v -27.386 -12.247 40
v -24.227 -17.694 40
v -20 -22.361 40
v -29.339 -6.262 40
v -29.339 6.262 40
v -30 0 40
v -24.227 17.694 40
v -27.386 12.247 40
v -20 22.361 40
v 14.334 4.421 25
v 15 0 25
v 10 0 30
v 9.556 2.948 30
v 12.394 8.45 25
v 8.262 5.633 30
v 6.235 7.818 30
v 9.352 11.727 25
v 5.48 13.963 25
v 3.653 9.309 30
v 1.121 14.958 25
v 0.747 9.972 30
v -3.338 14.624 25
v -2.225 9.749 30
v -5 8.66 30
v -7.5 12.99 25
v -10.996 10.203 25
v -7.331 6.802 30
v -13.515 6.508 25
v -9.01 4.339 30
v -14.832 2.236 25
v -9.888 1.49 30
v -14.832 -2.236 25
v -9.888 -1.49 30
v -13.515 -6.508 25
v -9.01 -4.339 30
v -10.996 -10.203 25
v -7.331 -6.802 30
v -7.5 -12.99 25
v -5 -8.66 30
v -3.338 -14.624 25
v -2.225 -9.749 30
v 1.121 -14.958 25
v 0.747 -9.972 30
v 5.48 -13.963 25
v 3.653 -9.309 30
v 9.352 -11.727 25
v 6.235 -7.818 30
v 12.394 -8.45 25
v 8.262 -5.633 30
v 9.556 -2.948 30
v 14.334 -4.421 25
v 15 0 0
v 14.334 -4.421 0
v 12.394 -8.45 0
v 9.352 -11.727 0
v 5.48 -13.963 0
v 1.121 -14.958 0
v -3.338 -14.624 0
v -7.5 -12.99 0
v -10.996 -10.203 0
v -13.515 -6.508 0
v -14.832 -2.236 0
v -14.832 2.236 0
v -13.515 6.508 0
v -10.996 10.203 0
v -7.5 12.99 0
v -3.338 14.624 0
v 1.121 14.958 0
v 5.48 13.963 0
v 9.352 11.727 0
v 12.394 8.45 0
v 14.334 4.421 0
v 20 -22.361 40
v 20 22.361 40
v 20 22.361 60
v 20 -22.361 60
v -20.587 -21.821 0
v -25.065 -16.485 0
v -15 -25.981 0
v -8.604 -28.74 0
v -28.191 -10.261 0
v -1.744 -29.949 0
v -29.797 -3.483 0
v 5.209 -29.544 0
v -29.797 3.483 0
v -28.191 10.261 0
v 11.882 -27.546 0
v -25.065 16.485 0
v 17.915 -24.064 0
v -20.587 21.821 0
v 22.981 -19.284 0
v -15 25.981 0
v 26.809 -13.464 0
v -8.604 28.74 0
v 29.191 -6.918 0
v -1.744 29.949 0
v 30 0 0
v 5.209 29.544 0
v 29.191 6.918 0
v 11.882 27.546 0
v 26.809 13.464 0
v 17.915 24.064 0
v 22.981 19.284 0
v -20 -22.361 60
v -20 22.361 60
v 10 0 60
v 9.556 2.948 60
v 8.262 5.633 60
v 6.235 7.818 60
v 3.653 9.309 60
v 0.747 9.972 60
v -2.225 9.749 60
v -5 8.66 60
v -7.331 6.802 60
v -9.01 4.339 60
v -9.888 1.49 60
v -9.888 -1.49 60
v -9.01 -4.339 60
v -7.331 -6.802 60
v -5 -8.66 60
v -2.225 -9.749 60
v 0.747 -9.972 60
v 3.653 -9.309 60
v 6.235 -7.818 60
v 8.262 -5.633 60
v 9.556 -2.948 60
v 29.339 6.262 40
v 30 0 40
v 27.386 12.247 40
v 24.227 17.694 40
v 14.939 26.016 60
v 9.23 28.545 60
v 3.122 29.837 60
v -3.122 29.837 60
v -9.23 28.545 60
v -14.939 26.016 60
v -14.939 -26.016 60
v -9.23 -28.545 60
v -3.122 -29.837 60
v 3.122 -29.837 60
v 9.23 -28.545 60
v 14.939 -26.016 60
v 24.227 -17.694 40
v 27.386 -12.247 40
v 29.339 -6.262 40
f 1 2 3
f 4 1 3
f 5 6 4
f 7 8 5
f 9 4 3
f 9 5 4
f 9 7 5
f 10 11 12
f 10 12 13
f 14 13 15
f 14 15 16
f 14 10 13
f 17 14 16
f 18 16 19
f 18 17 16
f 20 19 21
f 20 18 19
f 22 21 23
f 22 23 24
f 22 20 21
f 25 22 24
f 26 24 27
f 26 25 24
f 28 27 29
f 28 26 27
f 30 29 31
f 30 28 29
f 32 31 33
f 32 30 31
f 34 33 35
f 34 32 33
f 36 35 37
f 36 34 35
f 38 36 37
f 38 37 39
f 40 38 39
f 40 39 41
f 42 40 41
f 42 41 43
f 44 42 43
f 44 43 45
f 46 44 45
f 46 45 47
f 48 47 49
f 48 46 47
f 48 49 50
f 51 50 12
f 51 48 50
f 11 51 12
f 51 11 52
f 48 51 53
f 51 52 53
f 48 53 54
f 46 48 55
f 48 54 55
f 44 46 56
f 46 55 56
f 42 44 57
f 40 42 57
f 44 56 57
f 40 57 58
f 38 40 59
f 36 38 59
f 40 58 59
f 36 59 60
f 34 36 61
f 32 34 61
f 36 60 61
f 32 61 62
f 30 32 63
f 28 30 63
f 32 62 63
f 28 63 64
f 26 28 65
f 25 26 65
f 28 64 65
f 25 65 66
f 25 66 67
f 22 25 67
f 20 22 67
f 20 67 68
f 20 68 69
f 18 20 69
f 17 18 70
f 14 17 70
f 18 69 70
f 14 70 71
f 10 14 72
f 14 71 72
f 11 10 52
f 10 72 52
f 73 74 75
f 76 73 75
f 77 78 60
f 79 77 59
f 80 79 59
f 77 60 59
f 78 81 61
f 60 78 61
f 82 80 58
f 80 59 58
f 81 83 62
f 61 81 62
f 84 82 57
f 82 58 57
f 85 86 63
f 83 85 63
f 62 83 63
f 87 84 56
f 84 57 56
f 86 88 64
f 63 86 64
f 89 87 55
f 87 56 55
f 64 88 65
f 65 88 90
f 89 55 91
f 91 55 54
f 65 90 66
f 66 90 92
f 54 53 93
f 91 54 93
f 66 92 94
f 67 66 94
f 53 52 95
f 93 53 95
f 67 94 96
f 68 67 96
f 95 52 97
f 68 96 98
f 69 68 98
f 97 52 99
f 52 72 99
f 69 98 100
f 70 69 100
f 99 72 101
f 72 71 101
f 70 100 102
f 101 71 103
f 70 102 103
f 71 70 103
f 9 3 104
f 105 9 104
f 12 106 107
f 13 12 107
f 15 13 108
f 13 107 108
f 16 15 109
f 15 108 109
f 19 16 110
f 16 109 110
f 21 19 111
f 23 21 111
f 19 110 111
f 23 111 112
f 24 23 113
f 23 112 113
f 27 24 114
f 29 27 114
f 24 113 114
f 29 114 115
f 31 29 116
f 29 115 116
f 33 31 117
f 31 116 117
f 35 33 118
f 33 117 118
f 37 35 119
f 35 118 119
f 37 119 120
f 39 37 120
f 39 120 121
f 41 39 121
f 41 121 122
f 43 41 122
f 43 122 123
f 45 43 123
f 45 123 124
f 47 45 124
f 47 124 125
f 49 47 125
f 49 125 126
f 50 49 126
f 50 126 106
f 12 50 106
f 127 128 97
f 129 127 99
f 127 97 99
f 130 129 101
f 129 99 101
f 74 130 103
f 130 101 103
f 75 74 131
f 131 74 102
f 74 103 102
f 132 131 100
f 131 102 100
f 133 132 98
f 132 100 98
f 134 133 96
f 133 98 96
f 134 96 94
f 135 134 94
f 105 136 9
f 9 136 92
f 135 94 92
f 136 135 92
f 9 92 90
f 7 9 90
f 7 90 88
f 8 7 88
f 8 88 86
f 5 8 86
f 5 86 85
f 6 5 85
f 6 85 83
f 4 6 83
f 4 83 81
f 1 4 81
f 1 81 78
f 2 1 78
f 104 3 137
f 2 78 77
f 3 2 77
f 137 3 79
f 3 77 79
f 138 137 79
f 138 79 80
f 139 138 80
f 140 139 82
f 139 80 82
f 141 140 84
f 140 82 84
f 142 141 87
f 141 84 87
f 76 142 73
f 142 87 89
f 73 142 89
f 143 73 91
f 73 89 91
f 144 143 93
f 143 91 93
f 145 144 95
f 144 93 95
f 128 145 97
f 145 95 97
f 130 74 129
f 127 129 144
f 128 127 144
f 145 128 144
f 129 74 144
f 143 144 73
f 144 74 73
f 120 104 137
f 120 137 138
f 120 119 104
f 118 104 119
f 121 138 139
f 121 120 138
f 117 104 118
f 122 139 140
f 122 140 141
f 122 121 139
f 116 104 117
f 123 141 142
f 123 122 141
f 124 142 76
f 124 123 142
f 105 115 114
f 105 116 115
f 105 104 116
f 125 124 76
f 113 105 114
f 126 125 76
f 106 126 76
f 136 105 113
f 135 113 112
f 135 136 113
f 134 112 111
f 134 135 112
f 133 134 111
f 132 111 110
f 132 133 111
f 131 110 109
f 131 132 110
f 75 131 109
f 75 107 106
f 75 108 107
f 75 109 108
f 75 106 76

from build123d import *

# Parameters (mm, degrees)
F0_R     = 30
F1_DEPTH = 60
F2_W     = 10
F2_H     = 20
F3_DEPTH = 50
F4_R     = 15
F5_DEPTH = 25
F6_R     = 10
F7_DEPTH = 100
F8_SIZE  = 4.99999


# Not quite as in the source:
# - a fillet or chamfer is up to 0.001 mm smaller than in the source, because OpenCascade refuses the exact size


with BuildPart() as f1:
    # F0 (on Top) → F1 (new body)
    with BuildSketch(Plane.XY):
        Circle(F0_R)
    extrude(amount=F1_DEPTH)

    # F2 (on Front) → F3 (cut, symmetric)
    with BuildSketch(Plane.XZ):
        with Locations((-25, 50)):
            Rectangle(F2_W, F2_H)
        with Locations((25, 50)):
            Rectangle(F2_W, F2_H)
    extrude(amount=F3_DEPTH, both=True, mode=Mode.SUBTRACT)

    # F4 (on face) → F5 (cut)
    with BuildSketch(Plane(origin=(0, 0, 0), x_dir=(1, 0, 0), z_dir=(0, 0, -1))):
        Circle(F4_R)
    extrude(amount=-F5_DEPTH, mode=Mode.SUBTRACT)

    # F6 (on face) → F7 (cut)
    with BuildSketch(Plane.XY.offset(60)):
        Circle(F6_R)
    extrude(amount=-F7_DEPTH, mode=Mode.SUBTRACT)

    # F8 (size 5 in the source; OpenCascade refuses exactly that, so slightly less here)
    f8_edges = [f1.edges().sort_by_distance(p)[0] for p in [
        (-10, 0, 25),
    ]]
    chamfer(f8_edges, length=F8_SIZE)


solid = f1.part
